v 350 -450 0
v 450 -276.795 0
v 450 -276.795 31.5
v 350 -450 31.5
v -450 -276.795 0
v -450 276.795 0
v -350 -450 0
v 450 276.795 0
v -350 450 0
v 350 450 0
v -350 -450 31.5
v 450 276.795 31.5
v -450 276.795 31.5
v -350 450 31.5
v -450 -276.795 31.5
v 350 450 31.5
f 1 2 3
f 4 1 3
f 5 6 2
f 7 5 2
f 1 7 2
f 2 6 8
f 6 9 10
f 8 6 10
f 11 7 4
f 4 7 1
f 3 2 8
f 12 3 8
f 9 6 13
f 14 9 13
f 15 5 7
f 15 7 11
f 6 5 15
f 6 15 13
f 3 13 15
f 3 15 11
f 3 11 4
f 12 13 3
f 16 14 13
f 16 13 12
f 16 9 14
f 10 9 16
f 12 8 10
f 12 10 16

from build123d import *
from OCP.BRepFilletAPI import BRepFilletAPI_MakeChamfer

# Parameters (mm, degrees)
SCHIZZO1_W                   = 900
SCHIZZO1_H                   = 900
ESTRUSIONE_ESTRUSIONE1_DEPTH = 31.5
SMUSSO1_SIZE                 = 100
SMUSSO1_SIZE2                = 173.205080757
SMUSSO2_SIZE                 = 100
SMUSSO2_SIZE2                = 173.205080757


with BuildPart() as part:
    # Schizzo1 → Estrusione-Estrusione1 (new body)
    with BuildSketch(Plane.XY):
        Rectangle(SCHIZZO1_W, SCHIZZO1_H)
    extrude(amount=ESTRUSIONE_ESTRUSIONE1_DEPTH)

    # Smusso1: one chamfer whose edges measure the first distance from different faces: ONE call of the kernel's chamfer builder (chamfer() names one face for all edges)
    smusso1_edges_1 = [part.edges().sort_by_distance(p)[0] for p in [
        (450, -450, 15.75),
    ]]
    smusso1_side_1 = [part.faces().sort_by_distance(p)[0] for p in [
        (0, -450, 15.75),
    ]]
    smusso1_edges_2 = [part.edges().sort_by_distance(p)[0] for p in [
        (-450, 450, 15.75),
    ]]
    smusso1_side_2 = [part.faces().sort_by_distance(p)[0] for p in [
        (0, 450, 15.75),
    ]]
    smusso1 = BRepFilletAPI_MakeChamfer(part.part.solid().wrapped)
    for e in smusso1_edges_1:
        smusso1.Add(SMUSSO1_SIZE, SMUSSO1_SIZE2, e.wrapped, smusso1_side_1[0].wrapped)  # the first distance lies on this face
    for e in smusso1_edges_2:
        smusso1.Add(SMUSSO1_SIZE, SMUSSO1_SIZE2, e.wrapped, smusso1_side_2[0].wrapped)  # the first distance lies on this face
    add(Compound.cast(smusso1.Shape()), mode=Mode.REPLACE)

    # Smusso2: one chamfer whose edges measure the first distance from different faces: ONE call of the kernel's chamfer builder (chamfer() names one face for all edges)
    smusso2_edges_1 = [part.edges().sort_by_distance(p)[0] for p in [
        (-450, -450, 15.75),
    ]]
    smusso2_side_1 = [part.faces().sort_by_distance(p)[0] for p in [
        (-50, -450, 15.75),
    ]]
    smusso2_edges_2 = [part.edges().sort_by_distance(p)[0] for p in [
        (450, 450, 15.75),
    ]]
    smusso2_side_2 = [part.faces().sort_by_distance(p)[0] for p in [
        (50, 450, 15.75),
    ]]
    smusso2 = BRepFilletAPI_MakeChamfer(part.part.solid().wrapped)
    for e in smusso2_edges_1:
        smusso2.Add(SMUSSO2_SIZE, SMUSSO2_SIZE2, e.wrapped, smusso2_side_1[0].wrapped)  # the first distance lies on this face
    for e in smusso2_edges_2:
        smusso2.Add(SMUSSO2_SIZE, SMUSSO2_SIZE2, e.wrapped, smusso2_side_2[0].wrapped)  # the first distance lies on this face
    add(Compound.cast(smusso2.Shape()), mode=Mode.REPLACE)


solid = part.part
